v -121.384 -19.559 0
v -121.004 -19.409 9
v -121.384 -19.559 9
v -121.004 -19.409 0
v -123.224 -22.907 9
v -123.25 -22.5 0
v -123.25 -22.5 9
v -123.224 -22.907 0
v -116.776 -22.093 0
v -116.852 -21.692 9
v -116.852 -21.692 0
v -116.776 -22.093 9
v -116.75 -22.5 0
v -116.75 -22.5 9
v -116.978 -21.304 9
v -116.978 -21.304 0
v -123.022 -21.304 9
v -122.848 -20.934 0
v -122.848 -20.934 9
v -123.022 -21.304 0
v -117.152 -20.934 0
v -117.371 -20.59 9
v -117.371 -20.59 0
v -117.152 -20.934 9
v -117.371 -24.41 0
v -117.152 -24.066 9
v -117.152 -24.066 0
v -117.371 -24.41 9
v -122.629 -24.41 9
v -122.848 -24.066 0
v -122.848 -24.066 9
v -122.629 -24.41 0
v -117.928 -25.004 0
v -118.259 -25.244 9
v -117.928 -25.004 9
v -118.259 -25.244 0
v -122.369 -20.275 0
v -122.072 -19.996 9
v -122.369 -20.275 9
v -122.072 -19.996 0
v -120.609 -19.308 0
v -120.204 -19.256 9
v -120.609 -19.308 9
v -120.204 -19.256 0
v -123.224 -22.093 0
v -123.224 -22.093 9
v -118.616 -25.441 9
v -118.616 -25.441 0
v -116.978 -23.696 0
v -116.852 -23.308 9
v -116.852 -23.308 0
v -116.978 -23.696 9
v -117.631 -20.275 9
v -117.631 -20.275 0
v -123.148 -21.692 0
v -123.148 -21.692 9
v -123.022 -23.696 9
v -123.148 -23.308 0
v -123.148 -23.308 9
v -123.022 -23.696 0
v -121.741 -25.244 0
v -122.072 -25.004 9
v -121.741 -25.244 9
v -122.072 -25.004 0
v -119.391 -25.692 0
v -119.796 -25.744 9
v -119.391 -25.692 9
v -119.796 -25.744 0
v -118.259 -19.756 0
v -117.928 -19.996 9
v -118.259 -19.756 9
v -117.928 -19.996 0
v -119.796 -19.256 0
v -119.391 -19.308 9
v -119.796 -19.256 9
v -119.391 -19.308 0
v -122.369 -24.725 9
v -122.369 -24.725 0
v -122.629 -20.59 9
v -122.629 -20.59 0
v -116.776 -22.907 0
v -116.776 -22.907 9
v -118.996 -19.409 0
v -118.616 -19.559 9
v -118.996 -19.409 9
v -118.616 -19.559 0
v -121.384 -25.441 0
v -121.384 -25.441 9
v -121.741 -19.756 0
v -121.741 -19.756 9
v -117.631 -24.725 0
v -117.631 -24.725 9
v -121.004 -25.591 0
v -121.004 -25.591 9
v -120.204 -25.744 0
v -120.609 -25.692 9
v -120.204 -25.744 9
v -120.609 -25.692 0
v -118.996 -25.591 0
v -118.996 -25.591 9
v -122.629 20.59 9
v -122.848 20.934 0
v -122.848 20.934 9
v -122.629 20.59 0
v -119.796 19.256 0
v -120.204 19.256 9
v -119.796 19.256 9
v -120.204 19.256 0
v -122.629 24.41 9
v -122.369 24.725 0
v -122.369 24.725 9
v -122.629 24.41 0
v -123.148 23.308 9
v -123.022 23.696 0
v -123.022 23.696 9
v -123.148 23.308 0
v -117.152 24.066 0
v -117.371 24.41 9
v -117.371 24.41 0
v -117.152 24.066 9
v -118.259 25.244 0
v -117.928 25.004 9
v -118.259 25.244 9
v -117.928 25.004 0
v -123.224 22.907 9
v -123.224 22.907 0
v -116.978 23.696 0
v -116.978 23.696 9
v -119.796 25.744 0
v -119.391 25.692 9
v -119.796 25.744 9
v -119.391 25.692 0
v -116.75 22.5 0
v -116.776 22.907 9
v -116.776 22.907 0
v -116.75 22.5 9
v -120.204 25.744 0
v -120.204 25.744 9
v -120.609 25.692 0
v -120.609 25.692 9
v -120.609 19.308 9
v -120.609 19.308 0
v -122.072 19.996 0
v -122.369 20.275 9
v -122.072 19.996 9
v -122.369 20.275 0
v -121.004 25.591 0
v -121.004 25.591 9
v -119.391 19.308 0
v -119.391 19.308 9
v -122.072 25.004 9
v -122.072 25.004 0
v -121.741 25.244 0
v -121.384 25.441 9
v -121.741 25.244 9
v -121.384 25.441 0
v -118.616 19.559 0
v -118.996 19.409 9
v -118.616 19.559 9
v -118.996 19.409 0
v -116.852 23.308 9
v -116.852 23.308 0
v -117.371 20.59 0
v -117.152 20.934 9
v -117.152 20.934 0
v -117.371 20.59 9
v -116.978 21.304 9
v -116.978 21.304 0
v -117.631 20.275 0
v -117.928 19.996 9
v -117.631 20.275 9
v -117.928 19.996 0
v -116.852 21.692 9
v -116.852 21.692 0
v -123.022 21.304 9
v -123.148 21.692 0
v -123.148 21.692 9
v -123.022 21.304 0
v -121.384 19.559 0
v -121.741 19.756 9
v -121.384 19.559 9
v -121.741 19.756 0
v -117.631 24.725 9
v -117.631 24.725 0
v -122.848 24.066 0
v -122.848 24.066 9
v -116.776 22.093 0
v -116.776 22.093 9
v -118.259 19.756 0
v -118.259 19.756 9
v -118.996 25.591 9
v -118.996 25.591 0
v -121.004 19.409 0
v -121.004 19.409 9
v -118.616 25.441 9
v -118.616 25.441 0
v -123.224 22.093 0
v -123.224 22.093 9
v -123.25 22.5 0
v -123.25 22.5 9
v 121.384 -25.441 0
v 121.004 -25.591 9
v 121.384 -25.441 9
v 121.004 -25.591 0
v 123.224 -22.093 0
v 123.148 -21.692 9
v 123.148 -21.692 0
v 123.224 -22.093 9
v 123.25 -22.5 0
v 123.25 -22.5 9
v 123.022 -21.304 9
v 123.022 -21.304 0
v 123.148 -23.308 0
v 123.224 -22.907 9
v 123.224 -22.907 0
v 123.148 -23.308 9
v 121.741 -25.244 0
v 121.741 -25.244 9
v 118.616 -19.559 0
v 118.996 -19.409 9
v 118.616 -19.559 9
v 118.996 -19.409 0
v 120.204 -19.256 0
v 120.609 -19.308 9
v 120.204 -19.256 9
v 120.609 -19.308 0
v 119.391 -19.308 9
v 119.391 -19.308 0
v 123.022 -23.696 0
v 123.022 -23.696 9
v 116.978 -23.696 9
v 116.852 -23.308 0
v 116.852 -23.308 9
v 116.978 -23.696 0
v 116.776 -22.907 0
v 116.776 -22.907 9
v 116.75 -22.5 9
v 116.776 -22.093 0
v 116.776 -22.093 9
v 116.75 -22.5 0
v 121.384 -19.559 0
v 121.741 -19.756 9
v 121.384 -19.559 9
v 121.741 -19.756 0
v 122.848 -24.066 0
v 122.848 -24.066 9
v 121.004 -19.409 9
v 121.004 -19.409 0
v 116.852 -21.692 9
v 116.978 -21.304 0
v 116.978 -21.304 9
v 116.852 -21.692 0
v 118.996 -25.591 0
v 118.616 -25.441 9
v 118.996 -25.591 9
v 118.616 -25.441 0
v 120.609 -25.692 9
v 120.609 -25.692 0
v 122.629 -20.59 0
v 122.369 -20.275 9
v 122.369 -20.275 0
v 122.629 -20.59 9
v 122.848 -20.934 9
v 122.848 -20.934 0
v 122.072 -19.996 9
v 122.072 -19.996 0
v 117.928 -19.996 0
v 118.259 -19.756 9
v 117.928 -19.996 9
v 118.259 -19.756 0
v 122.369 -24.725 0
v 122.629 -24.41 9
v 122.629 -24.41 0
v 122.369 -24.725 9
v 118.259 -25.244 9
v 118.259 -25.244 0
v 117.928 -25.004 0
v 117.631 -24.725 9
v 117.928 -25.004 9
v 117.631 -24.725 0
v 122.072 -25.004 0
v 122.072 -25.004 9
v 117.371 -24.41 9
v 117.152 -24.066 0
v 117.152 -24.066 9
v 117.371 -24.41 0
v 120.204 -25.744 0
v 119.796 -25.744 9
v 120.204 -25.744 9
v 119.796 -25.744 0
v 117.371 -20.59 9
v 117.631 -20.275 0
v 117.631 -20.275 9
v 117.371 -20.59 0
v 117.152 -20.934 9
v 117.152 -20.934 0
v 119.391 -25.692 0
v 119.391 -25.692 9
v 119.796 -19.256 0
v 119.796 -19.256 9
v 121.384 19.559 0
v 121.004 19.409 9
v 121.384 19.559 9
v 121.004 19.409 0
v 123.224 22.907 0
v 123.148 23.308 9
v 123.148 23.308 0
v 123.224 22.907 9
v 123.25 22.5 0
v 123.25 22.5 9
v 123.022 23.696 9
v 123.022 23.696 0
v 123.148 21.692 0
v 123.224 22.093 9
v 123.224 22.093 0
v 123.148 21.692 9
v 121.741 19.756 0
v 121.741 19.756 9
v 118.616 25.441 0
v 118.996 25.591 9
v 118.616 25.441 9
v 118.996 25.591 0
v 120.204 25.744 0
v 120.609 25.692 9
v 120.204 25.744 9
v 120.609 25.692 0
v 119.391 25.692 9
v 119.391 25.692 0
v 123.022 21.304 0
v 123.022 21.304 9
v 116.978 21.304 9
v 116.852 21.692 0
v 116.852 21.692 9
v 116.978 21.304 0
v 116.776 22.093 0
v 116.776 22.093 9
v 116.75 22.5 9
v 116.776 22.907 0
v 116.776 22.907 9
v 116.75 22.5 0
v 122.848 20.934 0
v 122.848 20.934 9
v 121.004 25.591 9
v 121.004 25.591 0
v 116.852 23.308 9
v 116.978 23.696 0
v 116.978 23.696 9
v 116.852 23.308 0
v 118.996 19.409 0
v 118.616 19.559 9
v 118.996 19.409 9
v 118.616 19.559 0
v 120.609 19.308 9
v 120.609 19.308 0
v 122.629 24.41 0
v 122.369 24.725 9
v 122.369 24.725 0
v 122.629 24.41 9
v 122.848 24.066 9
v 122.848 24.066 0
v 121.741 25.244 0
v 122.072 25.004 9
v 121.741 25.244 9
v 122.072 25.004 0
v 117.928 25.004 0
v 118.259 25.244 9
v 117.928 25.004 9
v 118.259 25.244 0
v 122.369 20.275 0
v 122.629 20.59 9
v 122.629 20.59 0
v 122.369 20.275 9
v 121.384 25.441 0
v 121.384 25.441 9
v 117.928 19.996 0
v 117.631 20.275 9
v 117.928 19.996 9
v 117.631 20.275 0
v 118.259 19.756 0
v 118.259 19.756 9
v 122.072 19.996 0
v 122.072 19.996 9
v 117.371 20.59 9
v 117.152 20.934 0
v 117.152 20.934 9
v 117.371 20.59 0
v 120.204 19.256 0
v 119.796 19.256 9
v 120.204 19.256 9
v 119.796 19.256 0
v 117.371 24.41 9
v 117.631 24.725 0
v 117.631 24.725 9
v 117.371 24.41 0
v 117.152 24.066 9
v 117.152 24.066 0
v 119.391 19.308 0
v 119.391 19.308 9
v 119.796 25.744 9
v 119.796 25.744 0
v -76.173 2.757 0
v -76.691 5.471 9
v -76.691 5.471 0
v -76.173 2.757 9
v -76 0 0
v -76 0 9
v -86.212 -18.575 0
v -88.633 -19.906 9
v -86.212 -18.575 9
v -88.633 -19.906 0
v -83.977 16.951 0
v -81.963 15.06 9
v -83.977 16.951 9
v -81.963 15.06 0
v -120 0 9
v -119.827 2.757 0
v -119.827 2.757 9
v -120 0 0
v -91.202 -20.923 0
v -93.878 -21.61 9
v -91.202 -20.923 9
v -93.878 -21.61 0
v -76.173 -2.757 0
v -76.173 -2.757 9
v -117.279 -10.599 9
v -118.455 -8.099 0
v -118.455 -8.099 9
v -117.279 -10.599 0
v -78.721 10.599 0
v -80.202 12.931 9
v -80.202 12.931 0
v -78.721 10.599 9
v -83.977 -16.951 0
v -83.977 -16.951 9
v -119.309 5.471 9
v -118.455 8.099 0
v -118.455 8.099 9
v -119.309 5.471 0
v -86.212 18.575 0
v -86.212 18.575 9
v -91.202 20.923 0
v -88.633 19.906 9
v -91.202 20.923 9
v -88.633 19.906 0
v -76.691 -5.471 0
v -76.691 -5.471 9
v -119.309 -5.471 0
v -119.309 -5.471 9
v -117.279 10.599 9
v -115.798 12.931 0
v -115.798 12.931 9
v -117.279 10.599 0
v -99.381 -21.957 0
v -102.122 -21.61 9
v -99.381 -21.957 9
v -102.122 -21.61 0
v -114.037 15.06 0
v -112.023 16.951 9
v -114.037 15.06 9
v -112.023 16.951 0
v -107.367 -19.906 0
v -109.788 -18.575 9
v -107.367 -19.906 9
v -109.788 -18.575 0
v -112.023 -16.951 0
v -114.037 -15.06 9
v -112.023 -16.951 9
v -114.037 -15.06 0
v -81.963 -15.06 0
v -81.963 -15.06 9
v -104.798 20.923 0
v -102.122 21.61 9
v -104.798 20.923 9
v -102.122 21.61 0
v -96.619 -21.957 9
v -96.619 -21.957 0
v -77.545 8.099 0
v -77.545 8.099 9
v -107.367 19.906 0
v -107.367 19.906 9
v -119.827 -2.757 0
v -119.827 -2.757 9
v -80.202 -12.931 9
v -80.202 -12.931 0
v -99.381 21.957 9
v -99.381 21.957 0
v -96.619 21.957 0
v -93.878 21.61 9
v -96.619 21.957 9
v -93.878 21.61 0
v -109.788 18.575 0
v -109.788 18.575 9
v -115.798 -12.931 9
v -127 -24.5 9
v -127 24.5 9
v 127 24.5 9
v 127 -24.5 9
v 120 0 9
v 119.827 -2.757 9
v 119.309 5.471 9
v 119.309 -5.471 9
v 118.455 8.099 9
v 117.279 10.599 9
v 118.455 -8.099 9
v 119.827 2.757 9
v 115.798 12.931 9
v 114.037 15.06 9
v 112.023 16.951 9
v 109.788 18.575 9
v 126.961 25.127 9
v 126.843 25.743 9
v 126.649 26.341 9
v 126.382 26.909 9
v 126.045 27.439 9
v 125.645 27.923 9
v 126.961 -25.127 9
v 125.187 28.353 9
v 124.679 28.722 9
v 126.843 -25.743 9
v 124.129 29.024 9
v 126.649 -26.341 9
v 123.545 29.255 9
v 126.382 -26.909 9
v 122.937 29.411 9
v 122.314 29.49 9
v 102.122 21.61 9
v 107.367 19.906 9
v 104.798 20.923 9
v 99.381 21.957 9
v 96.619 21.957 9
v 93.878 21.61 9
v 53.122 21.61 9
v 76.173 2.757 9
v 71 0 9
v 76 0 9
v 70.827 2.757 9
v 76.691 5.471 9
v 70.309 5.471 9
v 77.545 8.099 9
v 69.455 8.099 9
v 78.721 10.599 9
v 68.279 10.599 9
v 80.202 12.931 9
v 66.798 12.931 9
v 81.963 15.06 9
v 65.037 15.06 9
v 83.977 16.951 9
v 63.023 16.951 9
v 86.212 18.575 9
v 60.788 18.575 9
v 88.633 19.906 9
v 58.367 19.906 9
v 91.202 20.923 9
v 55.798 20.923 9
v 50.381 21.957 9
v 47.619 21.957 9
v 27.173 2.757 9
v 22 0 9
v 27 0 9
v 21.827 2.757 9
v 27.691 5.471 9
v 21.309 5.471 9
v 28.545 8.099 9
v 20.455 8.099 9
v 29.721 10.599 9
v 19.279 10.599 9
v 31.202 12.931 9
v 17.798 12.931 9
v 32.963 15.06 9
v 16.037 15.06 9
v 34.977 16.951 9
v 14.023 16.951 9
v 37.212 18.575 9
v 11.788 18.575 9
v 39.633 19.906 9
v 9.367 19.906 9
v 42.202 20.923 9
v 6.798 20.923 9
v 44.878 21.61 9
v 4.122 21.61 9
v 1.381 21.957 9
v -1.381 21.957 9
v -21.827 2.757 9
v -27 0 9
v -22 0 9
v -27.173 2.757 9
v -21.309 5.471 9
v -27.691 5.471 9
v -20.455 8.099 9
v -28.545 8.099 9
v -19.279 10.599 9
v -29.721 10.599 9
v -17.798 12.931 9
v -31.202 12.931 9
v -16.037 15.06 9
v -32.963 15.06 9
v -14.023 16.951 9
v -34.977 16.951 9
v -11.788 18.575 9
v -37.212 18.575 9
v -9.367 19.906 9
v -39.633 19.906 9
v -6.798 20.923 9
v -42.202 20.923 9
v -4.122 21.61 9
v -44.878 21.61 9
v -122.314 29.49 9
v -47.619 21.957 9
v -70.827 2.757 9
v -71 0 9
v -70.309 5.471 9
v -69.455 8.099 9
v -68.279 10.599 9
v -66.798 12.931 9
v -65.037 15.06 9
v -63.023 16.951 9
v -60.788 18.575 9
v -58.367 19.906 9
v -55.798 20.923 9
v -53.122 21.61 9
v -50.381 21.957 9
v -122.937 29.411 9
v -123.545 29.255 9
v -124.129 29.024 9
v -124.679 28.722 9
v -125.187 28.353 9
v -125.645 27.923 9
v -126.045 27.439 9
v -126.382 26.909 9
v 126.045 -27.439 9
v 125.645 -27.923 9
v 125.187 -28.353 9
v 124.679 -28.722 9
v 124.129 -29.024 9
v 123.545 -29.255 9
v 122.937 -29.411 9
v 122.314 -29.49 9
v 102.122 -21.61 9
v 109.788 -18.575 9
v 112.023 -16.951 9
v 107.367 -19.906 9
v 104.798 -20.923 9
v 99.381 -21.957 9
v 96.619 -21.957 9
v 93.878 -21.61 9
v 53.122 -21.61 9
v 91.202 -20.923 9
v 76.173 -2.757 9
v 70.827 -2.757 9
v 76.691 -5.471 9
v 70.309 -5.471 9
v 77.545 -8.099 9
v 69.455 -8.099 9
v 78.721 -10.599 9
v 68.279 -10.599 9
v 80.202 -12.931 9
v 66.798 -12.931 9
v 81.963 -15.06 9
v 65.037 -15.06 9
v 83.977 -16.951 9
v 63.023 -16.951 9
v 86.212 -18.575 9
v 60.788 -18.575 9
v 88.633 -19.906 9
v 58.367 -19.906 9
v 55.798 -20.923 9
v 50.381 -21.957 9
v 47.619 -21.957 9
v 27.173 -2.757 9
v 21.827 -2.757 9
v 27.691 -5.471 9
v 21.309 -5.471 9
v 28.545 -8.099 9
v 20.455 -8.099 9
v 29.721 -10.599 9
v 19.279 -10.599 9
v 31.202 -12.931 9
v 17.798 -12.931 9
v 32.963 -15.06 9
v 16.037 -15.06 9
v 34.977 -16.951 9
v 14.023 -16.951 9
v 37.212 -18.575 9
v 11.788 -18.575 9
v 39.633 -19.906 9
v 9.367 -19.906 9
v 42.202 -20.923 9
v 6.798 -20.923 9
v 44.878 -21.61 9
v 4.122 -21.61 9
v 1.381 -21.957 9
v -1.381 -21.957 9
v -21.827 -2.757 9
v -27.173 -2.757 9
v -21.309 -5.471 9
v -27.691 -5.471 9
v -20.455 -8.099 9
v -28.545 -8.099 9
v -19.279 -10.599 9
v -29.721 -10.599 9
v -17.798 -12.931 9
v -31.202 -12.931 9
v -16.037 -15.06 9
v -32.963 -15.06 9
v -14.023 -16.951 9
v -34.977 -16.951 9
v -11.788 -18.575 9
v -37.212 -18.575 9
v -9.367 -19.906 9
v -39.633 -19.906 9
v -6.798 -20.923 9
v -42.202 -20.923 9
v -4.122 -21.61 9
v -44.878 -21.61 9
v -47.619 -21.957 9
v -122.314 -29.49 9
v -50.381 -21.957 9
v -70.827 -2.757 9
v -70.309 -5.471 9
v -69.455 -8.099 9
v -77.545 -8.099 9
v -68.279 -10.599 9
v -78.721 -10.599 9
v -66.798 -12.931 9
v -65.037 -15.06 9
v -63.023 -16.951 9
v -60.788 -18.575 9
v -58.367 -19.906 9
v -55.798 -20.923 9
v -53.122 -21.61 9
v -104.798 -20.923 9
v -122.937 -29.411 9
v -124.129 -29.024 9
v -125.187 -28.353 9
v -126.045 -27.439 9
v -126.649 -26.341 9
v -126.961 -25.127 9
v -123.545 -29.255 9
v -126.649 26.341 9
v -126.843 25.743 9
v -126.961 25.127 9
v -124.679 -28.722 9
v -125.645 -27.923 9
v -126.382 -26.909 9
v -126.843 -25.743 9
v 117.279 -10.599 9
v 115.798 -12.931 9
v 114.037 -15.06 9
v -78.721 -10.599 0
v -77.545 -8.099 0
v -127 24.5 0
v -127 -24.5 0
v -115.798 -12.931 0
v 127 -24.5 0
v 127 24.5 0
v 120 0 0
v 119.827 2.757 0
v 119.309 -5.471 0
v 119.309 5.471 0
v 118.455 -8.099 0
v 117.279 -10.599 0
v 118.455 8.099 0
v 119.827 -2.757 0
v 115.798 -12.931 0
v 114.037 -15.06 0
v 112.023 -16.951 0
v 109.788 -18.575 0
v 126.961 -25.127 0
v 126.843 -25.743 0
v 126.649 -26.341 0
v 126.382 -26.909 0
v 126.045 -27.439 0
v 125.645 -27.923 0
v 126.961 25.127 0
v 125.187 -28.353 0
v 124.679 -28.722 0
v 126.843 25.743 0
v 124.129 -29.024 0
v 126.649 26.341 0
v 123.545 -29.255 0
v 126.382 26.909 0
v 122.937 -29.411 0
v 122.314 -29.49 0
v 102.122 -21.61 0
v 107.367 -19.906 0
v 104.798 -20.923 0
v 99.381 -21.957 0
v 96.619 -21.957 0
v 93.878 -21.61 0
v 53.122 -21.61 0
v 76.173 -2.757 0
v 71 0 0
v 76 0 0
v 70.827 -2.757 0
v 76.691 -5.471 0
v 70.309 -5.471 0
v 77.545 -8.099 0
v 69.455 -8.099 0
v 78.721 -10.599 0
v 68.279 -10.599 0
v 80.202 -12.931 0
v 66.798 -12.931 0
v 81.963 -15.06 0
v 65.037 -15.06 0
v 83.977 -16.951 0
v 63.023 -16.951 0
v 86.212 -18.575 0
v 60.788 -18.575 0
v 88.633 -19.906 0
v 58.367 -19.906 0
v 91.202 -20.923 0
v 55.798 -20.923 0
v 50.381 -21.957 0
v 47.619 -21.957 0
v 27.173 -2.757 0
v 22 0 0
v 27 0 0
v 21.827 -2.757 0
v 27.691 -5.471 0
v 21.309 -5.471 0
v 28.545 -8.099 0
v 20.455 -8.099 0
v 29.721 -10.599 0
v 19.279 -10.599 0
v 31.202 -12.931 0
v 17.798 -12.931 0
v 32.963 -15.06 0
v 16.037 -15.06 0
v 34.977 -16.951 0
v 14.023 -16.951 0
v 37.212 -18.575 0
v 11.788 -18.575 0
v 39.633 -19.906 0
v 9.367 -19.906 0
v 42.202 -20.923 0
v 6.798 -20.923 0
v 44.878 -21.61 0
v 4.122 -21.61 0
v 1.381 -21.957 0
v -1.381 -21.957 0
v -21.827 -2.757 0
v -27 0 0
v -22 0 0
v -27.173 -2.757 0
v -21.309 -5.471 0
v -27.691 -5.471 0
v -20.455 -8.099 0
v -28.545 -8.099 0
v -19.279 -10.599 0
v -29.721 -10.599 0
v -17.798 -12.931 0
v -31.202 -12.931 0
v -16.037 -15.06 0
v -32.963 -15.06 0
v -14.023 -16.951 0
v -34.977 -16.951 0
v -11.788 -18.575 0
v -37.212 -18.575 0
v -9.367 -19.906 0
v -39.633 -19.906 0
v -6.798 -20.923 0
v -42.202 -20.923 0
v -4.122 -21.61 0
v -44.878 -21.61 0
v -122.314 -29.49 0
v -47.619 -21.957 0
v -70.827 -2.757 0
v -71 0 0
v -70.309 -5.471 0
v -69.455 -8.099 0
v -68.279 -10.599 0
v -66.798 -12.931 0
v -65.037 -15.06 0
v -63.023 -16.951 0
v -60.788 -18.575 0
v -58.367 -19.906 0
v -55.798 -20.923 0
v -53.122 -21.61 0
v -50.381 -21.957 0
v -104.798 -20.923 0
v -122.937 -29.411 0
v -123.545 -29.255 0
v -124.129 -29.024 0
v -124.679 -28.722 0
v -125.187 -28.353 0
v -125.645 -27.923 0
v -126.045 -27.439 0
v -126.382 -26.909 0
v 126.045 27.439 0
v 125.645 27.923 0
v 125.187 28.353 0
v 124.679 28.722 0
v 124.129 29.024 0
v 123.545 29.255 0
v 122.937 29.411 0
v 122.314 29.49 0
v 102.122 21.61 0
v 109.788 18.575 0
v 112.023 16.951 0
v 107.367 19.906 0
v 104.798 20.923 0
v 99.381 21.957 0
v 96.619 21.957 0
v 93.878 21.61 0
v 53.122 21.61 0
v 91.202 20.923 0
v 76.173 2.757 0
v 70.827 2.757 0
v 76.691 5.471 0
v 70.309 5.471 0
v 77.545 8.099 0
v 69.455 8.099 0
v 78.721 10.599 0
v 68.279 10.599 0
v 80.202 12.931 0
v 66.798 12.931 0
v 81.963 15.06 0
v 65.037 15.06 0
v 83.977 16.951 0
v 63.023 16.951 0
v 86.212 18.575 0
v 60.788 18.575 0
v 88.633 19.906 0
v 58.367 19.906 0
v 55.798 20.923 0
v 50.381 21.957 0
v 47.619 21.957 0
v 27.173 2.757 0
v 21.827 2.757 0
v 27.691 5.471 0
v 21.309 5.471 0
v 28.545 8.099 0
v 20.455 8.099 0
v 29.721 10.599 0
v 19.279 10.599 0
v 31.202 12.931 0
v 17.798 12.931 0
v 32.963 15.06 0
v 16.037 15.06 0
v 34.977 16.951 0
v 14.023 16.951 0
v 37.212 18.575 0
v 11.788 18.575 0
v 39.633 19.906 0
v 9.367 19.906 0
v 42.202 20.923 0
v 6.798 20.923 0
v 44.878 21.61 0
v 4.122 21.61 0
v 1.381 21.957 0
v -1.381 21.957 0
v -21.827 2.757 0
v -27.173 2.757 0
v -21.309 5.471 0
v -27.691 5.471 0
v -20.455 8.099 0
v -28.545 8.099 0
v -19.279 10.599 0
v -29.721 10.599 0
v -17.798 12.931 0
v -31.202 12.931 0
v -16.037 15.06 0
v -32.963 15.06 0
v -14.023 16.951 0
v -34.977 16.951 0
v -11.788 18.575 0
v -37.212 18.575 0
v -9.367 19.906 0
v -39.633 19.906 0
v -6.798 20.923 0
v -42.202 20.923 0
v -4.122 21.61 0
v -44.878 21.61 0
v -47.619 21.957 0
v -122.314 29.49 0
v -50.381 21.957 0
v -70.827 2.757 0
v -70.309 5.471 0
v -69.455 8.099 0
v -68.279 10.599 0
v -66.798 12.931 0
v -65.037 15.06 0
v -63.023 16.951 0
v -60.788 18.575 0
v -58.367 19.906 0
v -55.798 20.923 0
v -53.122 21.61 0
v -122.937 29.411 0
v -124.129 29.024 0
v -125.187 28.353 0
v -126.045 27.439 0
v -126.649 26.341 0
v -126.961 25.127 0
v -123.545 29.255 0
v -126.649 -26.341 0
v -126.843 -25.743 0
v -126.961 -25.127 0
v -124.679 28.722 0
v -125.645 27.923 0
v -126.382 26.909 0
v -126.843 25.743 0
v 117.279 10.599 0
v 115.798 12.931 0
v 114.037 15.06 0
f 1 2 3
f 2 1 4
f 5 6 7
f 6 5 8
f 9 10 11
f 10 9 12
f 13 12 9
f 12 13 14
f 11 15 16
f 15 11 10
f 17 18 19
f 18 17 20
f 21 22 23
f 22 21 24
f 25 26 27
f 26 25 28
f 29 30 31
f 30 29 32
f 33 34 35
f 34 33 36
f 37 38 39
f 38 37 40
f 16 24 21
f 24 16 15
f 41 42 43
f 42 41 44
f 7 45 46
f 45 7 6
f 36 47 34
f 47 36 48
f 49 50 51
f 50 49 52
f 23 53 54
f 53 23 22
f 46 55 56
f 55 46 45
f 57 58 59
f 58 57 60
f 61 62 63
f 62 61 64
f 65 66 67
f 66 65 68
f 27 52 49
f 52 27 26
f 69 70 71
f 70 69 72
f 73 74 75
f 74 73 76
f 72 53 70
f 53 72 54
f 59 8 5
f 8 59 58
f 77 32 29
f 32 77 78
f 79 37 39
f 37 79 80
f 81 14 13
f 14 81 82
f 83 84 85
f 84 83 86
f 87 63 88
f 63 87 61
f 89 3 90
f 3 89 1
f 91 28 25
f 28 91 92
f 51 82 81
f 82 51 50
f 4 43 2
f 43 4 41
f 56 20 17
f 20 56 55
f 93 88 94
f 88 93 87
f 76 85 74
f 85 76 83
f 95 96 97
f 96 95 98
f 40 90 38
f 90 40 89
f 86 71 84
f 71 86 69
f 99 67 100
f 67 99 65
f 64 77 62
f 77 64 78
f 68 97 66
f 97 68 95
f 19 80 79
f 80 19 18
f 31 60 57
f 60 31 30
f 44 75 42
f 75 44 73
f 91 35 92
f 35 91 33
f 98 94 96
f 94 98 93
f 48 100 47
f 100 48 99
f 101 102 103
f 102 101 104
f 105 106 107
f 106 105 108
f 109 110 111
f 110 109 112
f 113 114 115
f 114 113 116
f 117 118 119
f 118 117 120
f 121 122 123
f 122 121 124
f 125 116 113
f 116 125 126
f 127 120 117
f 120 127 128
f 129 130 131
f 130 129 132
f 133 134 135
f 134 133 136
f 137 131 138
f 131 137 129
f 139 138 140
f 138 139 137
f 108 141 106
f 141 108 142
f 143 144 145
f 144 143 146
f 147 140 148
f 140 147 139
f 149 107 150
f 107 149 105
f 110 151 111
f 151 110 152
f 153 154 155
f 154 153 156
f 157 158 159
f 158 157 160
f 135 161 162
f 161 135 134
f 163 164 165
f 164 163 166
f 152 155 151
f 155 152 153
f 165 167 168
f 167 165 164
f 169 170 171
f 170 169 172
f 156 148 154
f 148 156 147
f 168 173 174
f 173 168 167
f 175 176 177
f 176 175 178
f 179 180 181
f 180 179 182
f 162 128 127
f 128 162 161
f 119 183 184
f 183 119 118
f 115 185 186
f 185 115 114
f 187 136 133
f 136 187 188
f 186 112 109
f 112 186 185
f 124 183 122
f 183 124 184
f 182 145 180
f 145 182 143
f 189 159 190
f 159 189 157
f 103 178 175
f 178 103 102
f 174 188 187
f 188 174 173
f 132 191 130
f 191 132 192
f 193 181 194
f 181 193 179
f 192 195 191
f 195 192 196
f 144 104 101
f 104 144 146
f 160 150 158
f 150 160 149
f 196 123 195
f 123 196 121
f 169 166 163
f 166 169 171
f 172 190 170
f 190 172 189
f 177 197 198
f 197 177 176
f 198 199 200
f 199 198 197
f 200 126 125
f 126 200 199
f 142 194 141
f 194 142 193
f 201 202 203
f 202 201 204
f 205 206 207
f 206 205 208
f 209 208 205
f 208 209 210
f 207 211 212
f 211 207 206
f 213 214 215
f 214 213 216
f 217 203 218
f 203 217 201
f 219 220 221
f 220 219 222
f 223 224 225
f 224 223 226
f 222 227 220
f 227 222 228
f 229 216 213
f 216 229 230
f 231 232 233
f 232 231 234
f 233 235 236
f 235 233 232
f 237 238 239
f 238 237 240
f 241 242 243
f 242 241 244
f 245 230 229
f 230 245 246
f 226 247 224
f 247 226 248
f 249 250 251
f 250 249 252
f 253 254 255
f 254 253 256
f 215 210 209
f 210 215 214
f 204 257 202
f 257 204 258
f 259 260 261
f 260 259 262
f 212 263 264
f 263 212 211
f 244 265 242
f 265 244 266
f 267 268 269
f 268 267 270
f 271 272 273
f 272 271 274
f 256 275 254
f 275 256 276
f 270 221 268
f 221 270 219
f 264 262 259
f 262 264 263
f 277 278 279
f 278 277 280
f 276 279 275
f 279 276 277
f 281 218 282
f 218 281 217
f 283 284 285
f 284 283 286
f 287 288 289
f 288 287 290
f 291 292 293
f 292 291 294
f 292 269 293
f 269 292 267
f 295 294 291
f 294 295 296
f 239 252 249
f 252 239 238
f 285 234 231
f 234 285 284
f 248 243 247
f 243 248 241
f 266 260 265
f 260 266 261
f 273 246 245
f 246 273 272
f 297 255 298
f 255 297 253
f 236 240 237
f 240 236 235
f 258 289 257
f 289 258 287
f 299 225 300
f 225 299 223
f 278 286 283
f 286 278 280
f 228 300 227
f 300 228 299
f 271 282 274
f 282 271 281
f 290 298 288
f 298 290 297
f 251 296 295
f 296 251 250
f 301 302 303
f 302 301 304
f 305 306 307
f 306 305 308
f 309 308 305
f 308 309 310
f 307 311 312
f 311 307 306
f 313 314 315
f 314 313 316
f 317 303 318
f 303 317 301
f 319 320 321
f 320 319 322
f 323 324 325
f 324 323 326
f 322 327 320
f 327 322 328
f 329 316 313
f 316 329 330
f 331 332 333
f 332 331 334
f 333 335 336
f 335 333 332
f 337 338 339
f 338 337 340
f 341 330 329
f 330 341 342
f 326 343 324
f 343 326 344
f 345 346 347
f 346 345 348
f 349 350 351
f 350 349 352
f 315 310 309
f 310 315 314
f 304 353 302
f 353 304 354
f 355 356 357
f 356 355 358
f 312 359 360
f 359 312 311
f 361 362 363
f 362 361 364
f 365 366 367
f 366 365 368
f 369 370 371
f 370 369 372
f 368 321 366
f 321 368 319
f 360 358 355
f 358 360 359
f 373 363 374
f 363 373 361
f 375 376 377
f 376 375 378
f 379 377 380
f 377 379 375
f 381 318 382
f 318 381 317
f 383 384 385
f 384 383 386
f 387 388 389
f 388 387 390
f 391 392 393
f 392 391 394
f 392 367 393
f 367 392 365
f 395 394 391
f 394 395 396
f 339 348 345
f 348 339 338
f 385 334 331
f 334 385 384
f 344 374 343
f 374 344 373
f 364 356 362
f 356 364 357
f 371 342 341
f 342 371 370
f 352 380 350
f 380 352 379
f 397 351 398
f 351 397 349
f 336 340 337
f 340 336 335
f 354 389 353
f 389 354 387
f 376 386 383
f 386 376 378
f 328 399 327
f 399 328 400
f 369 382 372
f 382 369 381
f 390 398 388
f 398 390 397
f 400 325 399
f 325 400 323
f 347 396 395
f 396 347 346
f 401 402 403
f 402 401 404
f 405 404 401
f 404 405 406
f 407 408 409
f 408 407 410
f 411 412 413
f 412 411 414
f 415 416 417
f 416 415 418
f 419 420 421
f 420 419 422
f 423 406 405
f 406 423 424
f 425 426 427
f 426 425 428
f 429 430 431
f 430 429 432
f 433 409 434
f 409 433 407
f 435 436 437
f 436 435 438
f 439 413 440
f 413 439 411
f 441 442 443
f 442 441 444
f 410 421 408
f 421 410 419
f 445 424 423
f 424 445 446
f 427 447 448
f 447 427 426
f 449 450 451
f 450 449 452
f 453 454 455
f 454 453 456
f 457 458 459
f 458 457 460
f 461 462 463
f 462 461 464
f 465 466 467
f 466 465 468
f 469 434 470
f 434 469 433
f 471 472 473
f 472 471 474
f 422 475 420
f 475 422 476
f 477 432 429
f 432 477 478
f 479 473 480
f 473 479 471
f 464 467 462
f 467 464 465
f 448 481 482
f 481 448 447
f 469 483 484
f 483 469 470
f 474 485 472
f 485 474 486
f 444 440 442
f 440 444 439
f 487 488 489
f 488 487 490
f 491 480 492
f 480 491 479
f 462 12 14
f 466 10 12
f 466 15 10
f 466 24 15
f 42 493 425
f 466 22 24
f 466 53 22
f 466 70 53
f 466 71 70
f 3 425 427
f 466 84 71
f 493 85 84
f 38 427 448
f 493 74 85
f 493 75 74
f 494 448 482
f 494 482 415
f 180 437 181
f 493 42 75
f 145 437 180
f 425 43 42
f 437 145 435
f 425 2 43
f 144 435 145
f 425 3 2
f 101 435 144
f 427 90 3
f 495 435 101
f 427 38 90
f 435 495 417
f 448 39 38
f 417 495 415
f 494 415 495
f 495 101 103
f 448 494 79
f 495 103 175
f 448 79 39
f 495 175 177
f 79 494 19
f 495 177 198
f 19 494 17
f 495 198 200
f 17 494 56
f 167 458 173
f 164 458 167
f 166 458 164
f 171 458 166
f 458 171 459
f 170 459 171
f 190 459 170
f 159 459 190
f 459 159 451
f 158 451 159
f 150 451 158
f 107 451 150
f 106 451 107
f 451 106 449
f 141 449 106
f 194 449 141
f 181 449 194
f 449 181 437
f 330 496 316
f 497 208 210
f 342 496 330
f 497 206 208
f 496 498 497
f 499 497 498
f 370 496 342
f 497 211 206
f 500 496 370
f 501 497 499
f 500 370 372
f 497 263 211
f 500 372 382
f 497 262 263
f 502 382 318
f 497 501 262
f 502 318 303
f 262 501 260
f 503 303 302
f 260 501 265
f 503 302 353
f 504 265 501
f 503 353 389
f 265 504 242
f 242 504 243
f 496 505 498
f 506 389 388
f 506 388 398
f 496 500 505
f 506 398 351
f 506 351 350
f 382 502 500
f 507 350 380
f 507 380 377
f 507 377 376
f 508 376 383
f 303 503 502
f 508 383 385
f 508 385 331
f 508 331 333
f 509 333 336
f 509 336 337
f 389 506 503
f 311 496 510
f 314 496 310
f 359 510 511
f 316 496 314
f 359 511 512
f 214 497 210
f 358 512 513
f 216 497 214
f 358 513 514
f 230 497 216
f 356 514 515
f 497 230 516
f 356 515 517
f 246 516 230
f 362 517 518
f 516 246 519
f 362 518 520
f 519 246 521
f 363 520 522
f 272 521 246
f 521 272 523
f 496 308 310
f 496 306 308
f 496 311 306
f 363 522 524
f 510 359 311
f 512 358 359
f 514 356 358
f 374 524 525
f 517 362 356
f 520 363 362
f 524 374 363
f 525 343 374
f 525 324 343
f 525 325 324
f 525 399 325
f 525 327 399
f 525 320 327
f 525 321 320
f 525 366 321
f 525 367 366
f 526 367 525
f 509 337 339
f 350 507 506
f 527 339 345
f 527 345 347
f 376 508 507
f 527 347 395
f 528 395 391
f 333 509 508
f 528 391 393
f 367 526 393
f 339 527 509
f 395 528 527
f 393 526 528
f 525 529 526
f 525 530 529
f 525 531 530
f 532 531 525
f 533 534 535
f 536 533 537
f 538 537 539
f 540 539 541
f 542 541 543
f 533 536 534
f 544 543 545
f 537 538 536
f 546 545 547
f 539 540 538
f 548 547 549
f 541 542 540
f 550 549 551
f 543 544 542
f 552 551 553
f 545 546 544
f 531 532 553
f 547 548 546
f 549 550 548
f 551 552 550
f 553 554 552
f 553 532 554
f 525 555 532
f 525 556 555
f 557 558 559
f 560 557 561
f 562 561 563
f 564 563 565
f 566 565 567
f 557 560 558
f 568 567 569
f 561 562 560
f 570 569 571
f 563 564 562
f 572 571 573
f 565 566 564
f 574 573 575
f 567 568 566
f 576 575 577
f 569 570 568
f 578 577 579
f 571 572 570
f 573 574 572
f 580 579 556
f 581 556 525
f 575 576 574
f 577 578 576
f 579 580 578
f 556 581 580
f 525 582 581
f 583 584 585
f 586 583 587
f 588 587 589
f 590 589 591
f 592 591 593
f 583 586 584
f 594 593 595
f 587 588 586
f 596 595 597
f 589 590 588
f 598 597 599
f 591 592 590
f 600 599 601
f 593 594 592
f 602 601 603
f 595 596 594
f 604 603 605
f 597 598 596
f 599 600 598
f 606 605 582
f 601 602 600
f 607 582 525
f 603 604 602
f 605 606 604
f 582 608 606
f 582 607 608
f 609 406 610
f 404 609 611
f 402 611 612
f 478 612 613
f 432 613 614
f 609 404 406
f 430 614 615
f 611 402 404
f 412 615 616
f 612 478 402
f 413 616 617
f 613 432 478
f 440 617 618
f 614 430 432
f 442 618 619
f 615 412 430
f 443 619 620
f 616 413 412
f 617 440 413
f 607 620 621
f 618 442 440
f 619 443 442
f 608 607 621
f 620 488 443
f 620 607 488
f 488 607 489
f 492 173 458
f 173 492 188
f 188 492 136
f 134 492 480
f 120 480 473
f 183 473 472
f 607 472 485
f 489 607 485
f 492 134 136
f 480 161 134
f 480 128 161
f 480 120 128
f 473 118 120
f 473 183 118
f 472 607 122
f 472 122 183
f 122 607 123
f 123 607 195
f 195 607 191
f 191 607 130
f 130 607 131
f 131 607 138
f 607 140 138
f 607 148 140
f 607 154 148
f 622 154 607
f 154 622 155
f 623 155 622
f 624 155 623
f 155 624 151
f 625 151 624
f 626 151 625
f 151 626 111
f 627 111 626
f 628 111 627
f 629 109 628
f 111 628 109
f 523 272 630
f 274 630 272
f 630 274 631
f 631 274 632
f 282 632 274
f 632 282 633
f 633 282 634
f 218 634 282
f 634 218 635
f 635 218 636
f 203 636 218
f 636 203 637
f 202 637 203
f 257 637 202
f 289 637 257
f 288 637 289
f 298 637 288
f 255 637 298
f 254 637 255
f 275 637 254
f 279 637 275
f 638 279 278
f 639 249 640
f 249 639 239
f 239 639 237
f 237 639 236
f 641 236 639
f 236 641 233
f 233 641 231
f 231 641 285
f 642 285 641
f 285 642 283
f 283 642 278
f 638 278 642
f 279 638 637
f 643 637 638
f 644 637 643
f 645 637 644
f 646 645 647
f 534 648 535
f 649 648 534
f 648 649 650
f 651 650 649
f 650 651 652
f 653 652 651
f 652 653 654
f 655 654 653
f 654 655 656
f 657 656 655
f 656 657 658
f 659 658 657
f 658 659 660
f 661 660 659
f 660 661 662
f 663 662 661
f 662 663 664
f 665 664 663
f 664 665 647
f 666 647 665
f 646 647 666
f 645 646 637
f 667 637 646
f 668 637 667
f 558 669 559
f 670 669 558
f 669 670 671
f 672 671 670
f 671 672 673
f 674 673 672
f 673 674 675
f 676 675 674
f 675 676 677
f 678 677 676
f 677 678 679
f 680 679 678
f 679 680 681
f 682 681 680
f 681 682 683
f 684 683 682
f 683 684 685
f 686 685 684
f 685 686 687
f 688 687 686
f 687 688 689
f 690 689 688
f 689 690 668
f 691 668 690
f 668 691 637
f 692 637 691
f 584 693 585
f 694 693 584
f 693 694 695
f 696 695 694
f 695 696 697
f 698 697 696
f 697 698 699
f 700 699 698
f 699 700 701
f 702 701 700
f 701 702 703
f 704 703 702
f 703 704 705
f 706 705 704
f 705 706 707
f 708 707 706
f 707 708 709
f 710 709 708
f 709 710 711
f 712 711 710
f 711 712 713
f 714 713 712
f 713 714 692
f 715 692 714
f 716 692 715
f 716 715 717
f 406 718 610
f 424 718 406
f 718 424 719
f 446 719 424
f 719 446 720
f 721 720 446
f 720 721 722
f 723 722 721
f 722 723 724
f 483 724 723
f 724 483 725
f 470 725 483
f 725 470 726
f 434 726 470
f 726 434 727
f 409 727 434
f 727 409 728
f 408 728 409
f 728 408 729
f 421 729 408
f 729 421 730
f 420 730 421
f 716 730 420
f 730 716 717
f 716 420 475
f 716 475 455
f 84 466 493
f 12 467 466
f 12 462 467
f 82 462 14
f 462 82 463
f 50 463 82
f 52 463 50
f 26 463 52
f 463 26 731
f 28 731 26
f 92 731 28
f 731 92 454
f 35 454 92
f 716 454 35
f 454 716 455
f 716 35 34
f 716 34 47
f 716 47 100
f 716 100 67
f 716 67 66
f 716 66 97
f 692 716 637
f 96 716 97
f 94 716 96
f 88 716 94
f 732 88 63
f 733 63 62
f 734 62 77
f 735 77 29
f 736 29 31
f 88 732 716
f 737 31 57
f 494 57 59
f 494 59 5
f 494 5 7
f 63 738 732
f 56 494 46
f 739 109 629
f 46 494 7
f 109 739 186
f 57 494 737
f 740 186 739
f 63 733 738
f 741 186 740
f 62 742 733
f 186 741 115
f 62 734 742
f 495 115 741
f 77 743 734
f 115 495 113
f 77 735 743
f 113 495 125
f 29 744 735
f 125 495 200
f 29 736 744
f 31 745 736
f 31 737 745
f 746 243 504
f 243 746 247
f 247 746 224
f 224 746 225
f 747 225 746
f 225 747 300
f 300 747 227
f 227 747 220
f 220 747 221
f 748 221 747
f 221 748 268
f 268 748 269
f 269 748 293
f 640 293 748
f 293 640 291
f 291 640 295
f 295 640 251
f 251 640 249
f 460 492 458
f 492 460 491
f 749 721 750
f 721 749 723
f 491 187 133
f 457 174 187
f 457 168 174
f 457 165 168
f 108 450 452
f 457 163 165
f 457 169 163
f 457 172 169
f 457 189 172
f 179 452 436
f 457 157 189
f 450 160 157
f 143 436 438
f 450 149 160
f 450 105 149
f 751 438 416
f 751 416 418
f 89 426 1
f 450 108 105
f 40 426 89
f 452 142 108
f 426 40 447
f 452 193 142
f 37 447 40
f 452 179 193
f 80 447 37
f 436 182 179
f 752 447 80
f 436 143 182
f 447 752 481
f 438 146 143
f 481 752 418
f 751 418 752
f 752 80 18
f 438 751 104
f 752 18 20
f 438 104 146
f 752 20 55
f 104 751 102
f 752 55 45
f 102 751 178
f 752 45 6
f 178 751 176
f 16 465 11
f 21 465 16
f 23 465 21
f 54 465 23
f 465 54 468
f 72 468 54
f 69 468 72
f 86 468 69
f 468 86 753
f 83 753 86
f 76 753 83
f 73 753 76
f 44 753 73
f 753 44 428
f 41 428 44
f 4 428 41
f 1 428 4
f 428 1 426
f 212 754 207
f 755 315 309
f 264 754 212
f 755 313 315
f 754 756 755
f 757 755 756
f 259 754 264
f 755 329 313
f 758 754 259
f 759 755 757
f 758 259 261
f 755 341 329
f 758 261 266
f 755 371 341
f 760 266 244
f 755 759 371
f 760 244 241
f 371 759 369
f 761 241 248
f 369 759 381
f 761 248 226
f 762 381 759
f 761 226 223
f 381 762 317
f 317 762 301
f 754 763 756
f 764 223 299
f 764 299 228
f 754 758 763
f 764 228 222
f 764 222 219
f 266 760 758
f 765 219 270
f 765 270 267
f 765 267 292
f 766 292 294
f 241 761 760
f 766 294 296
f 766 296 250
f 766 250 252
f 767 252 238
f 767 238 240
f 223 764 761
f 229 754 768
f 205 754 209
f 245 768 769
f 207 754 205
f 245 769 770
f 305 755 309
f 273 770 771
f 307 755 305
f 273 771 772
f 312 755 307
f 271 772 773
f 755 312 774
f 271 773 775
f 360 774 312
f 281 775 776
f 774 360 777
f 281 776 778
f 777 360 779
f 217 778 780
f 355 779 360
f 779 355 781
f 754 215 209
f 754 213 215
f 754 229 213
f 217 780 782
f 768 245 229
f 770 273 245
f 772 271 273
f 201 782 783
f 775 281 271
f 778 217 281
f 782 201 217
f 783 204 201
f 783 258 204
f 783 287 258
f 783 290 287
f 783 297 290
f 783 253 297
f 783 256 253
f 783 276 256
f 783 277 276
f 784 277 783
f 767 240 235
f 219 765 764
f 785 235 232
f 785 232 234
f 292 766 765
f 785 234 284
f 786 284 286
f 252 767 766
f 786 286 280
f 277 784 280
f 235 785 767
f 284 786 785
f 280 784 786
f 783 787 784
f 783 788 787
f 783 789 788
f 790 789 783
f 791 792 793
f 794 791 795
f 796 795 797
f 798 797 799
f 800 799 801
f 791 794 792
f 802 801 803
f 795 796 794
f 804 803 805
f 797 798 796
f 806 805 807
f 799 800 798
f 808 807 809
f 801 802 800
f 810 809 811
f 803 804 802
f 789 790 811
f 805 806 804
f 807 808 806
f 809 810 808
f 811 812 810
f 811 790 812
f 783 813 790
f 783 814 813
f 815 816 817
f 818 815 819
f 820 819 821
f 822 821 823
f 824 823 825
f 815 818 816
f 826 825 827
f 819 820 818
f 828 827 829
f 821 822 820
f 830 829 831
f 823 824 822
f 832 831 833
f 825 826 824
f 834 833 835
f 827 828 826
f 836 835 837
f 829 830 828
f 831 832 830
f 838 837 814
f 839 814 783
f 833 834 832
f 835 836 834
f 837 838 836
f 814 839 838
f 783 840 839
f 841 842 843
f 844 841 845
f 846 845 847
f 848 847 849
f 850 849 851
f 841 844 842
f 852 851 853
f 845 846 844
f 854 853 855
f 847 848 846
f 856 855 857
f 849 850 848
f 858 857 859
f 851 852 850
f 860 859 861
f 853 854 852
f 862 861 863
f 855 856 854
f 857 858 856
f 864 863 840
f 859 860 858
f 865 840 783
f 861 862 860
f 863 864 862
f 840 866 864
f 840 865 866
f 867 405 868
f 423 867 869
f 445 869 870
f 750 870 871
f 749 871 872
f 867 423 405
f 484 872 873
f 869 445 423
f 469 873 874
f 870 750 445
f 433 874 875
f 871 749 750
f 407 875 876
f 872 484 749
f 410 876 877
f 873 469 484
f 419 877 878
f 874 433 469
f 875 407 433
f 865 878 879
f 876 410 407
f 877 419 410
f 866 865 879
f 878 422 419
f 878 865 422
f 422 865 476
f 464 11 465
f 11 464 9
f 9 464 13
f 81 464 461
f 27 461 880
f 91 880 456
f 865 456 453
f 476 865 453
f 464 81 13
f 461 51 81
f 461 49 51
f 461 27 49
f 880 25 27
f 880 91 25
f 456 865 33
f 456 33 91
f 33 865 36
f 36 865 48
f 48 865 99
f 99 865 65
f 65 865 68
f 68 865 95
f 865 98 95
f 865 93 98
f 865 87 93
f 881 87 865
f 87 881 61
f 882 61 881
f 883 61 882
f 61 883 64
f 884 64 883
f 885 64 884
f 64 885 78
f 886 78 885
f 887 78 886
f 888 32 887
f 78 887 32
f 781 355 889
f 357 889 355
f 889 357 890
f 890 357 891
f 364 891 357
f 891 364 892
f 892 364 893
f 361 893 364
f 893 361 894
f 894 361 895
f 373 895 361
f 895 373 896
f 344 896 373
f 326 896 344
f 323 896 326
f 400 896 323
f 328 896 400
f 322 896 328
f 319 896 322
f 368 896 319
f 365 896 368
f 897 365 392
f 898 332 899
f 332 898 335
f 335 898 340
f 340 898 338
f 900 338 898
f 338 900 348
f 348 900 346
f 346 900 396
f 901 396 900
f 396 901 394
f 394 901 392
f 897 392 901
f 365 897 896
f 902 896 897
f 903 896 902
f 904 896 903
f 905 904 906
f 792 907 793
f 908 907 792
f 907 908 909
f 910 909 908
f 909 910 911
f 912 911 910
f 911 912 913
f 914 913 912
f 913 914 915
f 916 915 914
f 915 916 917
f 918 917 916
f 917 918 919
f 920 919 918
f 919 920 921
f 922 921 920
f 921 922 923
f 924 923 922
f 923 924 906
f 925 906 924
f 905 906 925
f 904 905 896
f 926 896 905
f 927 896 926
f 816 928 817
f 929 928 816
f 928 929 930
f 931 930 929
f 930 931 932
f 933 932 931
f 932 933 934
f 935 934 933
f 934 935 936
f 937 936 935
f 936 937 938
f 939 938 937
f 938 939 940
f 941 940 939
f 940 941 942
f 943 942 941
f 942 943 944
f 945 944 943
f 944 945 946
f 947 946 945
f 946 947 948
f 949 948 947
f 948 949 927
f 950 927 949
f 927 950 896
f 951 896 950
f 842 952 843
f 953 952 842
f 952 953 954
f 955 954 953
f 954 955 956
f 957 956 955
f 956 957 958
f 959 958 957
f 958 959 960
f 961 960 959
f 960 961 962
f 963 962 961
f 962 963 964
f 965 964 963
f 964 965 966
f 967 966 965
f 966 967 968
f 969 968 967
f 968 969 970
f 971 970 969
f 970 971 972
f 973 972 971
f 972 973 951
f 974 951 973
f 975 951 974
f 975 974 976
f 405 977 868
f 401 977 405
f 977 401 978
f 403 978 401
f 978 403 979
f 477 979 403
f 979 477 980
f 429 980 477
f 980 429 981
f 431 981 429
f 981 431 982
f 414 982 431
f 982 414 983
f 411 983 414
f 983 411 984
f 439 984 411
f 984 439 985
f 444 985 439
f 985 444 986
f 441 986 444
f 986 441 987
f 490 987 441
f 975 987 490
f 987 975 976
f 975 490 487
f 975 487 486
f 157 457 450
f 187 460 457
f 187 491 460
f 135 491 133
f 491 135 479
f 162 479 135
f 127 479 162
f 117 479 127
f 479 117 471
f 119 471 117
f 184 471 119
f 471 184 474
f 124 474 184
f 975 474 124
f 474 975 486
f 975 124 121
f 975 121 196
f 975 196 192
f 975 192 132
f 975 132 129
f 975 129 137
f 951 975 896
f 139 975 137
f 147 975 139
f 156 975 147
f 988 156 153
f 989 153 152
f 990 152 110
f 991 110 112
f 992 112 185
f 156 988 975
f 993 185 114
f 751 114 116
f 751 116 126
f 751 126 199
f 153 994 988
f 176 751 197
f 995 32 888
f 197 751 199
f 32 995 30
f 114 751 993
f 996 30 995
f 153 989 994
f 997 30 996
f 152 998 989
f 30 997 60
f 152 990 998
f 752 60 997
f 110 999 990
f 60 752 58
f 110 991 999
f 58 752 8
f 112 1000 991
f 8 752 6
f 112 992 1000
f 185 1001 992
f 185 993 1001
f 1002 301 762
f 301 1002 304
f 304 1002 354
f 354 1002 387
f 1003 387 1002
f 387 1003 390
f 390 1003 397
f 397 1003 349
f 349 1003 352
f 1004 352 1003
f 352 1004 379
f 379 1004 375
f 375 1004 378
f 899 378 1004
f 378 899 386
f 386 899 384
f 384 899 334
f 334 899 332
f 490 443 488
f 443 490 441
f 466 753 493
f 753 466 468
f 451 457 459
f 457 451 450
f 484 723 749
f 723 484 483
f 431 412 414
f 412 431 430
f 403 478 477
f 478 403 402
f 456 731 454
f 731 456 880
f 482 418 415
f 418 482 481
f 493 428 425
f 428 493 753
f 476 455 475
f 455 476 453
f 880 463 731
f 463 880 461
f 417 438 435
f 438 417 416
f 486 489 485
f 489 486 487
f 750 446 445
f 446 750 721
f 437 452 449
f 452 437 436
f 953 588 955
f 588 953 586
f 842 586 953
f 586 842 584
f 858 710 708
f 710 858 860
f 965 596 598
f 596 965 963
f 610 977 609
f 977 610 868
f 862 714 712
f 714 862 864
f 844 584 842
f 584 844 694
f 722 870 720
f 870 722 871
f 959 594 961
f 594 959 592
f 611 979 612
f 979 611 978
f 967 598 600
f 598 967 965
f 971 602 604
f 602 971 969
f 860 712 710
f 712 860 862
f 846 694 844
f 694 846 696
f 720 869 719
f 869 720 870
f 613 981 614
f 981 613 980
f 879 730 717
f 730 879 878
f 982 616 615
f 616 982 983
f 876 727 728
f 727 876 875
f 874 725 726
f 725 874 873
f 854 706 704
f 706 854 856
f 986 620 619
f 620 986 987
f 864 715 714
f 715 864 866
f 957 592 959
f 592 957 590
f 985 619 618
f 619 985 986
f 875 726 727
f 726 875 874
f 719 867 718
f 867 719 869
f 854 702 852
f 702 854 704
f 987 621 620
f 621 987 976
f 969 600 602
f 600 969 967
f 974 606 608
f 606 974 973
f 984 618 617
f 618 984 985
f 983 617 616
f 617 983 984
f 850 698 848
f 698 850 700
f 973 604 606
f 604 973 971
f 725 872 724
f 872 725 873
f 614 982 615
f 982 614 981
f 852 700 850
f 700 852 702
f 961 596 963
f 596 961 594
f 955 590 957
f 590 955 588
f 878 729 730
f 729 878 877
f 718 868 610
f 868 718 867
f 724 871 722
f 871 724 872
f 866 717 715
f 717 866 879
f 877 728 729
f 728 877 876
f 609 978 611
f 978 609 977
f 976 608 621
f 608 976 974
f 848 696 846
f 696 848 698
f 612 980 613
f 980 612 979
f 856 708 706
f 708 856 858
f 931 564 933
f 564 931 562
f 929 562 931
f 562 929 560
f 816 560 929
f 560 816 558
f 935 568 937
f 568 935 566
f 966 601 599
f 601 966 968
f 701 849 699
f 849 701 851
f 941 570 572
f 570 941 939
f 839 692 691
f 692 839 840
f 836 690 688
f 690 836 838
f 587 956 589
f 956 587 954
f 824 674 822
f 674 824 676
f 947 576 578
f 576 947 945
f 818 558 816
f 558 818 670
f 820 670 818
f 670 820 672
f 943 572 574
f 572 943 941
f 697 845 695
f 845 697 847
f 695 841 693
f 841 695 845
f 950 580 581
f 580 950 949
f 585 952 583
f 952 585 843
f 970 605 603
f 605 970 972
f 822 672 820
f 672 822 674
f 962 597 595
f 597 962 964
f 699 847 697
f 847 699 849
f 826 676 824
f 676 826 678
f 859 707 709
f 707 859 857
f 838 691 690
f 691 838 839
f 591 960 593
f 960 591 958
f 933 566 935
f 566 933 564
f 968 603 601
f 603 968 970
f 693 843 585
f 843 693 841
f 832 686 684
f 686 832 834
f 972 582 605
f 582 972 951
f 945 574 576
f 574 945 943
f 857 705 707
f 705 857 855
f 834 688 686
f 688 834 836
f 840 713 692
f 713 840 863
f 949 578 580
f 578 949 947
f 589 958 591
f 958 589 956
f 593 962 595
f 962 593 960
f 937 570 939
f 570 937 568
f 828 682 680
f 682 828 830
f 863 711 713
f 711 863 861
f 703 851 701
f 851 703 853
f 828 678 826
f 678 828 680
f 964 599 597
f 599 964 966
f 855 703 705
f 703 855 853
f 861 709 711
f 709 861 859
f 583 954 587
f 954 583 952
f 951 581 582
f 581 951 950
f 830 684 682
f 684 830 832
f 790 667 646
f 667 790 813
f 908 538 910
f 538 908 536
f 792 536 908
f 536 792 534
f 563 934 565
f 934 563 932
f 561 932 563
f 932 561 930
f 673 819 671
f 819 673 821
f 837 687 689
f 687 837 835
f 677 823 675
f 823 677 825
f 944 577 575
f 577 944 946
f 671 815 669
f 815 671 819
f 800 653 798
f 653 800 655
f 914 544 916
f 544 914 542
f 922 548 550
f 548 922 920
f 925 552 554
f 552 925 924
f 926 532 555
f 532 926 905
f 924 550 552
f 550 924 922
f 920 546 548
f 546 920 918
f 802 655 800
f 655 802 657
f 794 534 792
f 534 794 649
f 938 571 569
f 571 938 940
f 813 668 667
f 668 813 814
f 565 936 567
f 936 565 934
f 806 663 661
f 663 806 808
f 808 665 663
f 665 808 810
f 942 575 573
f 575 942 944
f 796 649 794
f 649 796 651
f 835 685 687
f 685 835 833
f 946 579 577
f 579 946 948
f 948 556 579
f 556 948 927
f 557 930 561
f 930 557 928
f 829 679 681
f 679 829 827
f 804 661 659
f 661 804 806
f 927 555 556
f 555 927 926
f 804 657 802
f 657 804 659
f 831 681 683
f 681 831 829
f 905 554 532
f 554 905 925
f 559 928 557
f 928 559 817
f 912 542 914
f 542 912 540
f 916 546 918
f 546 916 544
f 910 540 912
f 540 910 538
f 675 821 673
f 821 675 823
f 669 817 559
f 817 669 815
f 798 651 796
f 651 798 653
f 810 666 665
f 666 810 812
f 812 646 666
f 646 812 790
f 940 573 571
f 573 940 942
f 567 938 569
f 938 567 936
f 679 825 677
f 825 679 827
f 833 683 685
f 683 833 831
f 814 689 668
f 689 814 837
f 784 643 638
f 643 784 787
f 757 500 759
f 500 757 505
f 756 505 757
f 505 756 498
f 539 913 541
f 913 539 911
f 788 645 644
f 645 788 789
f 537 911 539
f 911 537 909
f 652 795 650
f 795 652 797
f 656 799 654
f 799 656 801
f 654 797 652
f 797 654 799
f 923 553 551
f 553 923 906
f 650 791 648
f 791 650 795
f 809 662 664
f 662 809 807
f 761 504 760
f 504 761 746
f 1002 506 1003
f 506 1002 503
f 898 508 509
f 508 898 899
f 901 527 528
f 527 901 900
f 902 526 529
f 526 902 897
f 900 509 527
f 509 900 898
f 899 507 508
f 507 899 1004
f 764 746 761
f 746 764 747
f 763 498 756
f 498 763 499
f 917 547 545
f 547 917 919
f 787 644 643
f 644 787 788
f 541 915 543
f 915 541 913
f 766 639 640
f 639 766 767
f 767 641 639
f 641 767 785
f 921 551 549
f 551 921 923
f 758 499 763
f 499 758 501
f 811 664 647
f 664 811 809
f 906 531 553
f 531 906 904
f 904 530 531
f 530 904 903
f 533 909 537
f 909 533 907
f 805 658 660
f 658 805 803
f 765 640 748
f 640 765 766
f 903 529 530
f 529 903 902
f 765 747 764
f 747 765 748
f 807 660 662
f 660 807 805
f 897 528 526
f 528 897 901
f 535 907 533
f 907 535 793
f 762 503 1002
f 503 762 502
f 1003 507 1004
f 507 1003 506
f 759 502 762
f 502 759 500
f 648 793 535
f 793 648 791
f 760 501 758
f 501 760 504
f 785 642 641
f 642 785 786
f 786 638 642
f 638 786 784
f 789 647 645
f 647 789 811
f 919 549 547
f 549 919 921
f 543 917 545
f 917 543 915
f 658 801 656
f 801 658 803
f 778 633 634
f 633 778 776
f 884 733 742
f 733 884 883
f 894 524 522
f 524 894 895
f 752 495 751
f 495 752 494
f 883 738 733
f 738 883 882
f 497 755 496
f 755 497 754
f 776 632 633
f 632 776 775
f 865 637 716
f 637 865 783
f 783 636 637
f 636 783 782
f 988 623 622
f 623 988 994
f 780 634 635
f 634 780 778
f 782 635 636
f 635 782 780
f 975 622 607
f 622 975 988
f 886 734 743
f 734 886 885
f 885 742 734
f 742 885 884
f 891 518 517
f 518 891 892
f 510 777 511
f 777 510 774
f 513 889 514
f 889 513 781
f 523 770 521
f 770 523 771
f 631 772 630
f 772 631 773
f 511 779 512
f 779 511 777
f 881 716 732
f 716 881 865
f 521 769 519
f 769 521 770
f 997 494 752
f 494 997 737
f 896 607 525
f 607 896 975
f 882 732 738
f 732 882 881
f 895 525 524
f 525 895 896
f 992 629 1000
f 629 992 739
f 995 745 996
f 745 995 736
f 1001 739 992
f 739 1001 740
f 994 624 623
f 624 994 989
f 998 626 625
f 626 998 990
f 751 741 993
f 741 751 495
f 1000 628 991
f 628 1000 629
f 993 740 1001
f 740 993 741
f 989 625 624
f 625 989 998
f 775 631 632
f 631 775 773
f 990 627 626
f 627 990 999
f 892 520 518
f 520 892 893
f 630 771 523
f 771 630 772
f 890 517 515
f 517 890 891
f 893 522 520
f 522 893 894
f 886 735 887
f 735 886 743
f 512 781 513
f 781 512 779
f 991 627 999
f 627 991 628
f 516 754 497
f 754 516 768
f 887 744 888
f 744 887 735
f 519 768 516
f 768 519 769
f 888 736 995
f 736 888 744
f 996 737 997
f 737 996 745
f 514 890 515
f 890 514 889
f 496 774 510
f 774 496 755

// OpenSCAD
$fn = 50;


difference() {
	union() {
		hull() {
			translate(v = [-122.0000000000, 24.5000000000, 0]) {
				cylinder(h = 9, r = 5);
			}
			translate(v = [122.0000000000, 24.5000000000, 0]) {
				cylinder(h = 9, r = 5);
			}
			translate(v = [-122.0000000000, -24.5000000000, 0]) {
				cylinder(h = 9, r = 5);
			}
			translate(v = [122.0000000000, -24.5000000000, 0]) {
				cylinder(h = 9, r = 5);
			}
		}
	}
	union() {
		#translate(v = [-120.0000000000, -22.5000000000, -100.0000000000]) {
			cylinder(h = 200, r = 3.2500000000);
		}
		#translate(v = [-120.0000000000, 22.5000000000, -100.0000000000]) {
			cylinder(h = 200, r = 3.2500000000);
		}
		#translate(v = [120.0000000000, -22.5000000000, -100.0000000000]) {
			cylinder(h = 200, r = 3.2500000000);
		}
		#translate(v = [120.0000000000, 22.5000000000, -100.0000000000]) {
			cylinder(h = 200, r = 3.2500000000);
		}
		#translate(v = [-98.0000000000, 0, 0]) {
			cylinder(h = 9, r = 22.0000000000);
		}
		#translate(v = [-49.0000000000, 0, 0]) {
			cylinder(h = 9, r = 22.0000000000);
		}
		#cylinder(h = 9, r = 22.0000000000);
		#translate(v = [49.0000000000, 0, 0]) {
			cylinder(h = 9, r = 22.0000000000);
		}
		#translate(v = [98.0000000000, 0, 0]) {
			cylinder(h = 9, r = 22.0000000000);
		}
	}
}
